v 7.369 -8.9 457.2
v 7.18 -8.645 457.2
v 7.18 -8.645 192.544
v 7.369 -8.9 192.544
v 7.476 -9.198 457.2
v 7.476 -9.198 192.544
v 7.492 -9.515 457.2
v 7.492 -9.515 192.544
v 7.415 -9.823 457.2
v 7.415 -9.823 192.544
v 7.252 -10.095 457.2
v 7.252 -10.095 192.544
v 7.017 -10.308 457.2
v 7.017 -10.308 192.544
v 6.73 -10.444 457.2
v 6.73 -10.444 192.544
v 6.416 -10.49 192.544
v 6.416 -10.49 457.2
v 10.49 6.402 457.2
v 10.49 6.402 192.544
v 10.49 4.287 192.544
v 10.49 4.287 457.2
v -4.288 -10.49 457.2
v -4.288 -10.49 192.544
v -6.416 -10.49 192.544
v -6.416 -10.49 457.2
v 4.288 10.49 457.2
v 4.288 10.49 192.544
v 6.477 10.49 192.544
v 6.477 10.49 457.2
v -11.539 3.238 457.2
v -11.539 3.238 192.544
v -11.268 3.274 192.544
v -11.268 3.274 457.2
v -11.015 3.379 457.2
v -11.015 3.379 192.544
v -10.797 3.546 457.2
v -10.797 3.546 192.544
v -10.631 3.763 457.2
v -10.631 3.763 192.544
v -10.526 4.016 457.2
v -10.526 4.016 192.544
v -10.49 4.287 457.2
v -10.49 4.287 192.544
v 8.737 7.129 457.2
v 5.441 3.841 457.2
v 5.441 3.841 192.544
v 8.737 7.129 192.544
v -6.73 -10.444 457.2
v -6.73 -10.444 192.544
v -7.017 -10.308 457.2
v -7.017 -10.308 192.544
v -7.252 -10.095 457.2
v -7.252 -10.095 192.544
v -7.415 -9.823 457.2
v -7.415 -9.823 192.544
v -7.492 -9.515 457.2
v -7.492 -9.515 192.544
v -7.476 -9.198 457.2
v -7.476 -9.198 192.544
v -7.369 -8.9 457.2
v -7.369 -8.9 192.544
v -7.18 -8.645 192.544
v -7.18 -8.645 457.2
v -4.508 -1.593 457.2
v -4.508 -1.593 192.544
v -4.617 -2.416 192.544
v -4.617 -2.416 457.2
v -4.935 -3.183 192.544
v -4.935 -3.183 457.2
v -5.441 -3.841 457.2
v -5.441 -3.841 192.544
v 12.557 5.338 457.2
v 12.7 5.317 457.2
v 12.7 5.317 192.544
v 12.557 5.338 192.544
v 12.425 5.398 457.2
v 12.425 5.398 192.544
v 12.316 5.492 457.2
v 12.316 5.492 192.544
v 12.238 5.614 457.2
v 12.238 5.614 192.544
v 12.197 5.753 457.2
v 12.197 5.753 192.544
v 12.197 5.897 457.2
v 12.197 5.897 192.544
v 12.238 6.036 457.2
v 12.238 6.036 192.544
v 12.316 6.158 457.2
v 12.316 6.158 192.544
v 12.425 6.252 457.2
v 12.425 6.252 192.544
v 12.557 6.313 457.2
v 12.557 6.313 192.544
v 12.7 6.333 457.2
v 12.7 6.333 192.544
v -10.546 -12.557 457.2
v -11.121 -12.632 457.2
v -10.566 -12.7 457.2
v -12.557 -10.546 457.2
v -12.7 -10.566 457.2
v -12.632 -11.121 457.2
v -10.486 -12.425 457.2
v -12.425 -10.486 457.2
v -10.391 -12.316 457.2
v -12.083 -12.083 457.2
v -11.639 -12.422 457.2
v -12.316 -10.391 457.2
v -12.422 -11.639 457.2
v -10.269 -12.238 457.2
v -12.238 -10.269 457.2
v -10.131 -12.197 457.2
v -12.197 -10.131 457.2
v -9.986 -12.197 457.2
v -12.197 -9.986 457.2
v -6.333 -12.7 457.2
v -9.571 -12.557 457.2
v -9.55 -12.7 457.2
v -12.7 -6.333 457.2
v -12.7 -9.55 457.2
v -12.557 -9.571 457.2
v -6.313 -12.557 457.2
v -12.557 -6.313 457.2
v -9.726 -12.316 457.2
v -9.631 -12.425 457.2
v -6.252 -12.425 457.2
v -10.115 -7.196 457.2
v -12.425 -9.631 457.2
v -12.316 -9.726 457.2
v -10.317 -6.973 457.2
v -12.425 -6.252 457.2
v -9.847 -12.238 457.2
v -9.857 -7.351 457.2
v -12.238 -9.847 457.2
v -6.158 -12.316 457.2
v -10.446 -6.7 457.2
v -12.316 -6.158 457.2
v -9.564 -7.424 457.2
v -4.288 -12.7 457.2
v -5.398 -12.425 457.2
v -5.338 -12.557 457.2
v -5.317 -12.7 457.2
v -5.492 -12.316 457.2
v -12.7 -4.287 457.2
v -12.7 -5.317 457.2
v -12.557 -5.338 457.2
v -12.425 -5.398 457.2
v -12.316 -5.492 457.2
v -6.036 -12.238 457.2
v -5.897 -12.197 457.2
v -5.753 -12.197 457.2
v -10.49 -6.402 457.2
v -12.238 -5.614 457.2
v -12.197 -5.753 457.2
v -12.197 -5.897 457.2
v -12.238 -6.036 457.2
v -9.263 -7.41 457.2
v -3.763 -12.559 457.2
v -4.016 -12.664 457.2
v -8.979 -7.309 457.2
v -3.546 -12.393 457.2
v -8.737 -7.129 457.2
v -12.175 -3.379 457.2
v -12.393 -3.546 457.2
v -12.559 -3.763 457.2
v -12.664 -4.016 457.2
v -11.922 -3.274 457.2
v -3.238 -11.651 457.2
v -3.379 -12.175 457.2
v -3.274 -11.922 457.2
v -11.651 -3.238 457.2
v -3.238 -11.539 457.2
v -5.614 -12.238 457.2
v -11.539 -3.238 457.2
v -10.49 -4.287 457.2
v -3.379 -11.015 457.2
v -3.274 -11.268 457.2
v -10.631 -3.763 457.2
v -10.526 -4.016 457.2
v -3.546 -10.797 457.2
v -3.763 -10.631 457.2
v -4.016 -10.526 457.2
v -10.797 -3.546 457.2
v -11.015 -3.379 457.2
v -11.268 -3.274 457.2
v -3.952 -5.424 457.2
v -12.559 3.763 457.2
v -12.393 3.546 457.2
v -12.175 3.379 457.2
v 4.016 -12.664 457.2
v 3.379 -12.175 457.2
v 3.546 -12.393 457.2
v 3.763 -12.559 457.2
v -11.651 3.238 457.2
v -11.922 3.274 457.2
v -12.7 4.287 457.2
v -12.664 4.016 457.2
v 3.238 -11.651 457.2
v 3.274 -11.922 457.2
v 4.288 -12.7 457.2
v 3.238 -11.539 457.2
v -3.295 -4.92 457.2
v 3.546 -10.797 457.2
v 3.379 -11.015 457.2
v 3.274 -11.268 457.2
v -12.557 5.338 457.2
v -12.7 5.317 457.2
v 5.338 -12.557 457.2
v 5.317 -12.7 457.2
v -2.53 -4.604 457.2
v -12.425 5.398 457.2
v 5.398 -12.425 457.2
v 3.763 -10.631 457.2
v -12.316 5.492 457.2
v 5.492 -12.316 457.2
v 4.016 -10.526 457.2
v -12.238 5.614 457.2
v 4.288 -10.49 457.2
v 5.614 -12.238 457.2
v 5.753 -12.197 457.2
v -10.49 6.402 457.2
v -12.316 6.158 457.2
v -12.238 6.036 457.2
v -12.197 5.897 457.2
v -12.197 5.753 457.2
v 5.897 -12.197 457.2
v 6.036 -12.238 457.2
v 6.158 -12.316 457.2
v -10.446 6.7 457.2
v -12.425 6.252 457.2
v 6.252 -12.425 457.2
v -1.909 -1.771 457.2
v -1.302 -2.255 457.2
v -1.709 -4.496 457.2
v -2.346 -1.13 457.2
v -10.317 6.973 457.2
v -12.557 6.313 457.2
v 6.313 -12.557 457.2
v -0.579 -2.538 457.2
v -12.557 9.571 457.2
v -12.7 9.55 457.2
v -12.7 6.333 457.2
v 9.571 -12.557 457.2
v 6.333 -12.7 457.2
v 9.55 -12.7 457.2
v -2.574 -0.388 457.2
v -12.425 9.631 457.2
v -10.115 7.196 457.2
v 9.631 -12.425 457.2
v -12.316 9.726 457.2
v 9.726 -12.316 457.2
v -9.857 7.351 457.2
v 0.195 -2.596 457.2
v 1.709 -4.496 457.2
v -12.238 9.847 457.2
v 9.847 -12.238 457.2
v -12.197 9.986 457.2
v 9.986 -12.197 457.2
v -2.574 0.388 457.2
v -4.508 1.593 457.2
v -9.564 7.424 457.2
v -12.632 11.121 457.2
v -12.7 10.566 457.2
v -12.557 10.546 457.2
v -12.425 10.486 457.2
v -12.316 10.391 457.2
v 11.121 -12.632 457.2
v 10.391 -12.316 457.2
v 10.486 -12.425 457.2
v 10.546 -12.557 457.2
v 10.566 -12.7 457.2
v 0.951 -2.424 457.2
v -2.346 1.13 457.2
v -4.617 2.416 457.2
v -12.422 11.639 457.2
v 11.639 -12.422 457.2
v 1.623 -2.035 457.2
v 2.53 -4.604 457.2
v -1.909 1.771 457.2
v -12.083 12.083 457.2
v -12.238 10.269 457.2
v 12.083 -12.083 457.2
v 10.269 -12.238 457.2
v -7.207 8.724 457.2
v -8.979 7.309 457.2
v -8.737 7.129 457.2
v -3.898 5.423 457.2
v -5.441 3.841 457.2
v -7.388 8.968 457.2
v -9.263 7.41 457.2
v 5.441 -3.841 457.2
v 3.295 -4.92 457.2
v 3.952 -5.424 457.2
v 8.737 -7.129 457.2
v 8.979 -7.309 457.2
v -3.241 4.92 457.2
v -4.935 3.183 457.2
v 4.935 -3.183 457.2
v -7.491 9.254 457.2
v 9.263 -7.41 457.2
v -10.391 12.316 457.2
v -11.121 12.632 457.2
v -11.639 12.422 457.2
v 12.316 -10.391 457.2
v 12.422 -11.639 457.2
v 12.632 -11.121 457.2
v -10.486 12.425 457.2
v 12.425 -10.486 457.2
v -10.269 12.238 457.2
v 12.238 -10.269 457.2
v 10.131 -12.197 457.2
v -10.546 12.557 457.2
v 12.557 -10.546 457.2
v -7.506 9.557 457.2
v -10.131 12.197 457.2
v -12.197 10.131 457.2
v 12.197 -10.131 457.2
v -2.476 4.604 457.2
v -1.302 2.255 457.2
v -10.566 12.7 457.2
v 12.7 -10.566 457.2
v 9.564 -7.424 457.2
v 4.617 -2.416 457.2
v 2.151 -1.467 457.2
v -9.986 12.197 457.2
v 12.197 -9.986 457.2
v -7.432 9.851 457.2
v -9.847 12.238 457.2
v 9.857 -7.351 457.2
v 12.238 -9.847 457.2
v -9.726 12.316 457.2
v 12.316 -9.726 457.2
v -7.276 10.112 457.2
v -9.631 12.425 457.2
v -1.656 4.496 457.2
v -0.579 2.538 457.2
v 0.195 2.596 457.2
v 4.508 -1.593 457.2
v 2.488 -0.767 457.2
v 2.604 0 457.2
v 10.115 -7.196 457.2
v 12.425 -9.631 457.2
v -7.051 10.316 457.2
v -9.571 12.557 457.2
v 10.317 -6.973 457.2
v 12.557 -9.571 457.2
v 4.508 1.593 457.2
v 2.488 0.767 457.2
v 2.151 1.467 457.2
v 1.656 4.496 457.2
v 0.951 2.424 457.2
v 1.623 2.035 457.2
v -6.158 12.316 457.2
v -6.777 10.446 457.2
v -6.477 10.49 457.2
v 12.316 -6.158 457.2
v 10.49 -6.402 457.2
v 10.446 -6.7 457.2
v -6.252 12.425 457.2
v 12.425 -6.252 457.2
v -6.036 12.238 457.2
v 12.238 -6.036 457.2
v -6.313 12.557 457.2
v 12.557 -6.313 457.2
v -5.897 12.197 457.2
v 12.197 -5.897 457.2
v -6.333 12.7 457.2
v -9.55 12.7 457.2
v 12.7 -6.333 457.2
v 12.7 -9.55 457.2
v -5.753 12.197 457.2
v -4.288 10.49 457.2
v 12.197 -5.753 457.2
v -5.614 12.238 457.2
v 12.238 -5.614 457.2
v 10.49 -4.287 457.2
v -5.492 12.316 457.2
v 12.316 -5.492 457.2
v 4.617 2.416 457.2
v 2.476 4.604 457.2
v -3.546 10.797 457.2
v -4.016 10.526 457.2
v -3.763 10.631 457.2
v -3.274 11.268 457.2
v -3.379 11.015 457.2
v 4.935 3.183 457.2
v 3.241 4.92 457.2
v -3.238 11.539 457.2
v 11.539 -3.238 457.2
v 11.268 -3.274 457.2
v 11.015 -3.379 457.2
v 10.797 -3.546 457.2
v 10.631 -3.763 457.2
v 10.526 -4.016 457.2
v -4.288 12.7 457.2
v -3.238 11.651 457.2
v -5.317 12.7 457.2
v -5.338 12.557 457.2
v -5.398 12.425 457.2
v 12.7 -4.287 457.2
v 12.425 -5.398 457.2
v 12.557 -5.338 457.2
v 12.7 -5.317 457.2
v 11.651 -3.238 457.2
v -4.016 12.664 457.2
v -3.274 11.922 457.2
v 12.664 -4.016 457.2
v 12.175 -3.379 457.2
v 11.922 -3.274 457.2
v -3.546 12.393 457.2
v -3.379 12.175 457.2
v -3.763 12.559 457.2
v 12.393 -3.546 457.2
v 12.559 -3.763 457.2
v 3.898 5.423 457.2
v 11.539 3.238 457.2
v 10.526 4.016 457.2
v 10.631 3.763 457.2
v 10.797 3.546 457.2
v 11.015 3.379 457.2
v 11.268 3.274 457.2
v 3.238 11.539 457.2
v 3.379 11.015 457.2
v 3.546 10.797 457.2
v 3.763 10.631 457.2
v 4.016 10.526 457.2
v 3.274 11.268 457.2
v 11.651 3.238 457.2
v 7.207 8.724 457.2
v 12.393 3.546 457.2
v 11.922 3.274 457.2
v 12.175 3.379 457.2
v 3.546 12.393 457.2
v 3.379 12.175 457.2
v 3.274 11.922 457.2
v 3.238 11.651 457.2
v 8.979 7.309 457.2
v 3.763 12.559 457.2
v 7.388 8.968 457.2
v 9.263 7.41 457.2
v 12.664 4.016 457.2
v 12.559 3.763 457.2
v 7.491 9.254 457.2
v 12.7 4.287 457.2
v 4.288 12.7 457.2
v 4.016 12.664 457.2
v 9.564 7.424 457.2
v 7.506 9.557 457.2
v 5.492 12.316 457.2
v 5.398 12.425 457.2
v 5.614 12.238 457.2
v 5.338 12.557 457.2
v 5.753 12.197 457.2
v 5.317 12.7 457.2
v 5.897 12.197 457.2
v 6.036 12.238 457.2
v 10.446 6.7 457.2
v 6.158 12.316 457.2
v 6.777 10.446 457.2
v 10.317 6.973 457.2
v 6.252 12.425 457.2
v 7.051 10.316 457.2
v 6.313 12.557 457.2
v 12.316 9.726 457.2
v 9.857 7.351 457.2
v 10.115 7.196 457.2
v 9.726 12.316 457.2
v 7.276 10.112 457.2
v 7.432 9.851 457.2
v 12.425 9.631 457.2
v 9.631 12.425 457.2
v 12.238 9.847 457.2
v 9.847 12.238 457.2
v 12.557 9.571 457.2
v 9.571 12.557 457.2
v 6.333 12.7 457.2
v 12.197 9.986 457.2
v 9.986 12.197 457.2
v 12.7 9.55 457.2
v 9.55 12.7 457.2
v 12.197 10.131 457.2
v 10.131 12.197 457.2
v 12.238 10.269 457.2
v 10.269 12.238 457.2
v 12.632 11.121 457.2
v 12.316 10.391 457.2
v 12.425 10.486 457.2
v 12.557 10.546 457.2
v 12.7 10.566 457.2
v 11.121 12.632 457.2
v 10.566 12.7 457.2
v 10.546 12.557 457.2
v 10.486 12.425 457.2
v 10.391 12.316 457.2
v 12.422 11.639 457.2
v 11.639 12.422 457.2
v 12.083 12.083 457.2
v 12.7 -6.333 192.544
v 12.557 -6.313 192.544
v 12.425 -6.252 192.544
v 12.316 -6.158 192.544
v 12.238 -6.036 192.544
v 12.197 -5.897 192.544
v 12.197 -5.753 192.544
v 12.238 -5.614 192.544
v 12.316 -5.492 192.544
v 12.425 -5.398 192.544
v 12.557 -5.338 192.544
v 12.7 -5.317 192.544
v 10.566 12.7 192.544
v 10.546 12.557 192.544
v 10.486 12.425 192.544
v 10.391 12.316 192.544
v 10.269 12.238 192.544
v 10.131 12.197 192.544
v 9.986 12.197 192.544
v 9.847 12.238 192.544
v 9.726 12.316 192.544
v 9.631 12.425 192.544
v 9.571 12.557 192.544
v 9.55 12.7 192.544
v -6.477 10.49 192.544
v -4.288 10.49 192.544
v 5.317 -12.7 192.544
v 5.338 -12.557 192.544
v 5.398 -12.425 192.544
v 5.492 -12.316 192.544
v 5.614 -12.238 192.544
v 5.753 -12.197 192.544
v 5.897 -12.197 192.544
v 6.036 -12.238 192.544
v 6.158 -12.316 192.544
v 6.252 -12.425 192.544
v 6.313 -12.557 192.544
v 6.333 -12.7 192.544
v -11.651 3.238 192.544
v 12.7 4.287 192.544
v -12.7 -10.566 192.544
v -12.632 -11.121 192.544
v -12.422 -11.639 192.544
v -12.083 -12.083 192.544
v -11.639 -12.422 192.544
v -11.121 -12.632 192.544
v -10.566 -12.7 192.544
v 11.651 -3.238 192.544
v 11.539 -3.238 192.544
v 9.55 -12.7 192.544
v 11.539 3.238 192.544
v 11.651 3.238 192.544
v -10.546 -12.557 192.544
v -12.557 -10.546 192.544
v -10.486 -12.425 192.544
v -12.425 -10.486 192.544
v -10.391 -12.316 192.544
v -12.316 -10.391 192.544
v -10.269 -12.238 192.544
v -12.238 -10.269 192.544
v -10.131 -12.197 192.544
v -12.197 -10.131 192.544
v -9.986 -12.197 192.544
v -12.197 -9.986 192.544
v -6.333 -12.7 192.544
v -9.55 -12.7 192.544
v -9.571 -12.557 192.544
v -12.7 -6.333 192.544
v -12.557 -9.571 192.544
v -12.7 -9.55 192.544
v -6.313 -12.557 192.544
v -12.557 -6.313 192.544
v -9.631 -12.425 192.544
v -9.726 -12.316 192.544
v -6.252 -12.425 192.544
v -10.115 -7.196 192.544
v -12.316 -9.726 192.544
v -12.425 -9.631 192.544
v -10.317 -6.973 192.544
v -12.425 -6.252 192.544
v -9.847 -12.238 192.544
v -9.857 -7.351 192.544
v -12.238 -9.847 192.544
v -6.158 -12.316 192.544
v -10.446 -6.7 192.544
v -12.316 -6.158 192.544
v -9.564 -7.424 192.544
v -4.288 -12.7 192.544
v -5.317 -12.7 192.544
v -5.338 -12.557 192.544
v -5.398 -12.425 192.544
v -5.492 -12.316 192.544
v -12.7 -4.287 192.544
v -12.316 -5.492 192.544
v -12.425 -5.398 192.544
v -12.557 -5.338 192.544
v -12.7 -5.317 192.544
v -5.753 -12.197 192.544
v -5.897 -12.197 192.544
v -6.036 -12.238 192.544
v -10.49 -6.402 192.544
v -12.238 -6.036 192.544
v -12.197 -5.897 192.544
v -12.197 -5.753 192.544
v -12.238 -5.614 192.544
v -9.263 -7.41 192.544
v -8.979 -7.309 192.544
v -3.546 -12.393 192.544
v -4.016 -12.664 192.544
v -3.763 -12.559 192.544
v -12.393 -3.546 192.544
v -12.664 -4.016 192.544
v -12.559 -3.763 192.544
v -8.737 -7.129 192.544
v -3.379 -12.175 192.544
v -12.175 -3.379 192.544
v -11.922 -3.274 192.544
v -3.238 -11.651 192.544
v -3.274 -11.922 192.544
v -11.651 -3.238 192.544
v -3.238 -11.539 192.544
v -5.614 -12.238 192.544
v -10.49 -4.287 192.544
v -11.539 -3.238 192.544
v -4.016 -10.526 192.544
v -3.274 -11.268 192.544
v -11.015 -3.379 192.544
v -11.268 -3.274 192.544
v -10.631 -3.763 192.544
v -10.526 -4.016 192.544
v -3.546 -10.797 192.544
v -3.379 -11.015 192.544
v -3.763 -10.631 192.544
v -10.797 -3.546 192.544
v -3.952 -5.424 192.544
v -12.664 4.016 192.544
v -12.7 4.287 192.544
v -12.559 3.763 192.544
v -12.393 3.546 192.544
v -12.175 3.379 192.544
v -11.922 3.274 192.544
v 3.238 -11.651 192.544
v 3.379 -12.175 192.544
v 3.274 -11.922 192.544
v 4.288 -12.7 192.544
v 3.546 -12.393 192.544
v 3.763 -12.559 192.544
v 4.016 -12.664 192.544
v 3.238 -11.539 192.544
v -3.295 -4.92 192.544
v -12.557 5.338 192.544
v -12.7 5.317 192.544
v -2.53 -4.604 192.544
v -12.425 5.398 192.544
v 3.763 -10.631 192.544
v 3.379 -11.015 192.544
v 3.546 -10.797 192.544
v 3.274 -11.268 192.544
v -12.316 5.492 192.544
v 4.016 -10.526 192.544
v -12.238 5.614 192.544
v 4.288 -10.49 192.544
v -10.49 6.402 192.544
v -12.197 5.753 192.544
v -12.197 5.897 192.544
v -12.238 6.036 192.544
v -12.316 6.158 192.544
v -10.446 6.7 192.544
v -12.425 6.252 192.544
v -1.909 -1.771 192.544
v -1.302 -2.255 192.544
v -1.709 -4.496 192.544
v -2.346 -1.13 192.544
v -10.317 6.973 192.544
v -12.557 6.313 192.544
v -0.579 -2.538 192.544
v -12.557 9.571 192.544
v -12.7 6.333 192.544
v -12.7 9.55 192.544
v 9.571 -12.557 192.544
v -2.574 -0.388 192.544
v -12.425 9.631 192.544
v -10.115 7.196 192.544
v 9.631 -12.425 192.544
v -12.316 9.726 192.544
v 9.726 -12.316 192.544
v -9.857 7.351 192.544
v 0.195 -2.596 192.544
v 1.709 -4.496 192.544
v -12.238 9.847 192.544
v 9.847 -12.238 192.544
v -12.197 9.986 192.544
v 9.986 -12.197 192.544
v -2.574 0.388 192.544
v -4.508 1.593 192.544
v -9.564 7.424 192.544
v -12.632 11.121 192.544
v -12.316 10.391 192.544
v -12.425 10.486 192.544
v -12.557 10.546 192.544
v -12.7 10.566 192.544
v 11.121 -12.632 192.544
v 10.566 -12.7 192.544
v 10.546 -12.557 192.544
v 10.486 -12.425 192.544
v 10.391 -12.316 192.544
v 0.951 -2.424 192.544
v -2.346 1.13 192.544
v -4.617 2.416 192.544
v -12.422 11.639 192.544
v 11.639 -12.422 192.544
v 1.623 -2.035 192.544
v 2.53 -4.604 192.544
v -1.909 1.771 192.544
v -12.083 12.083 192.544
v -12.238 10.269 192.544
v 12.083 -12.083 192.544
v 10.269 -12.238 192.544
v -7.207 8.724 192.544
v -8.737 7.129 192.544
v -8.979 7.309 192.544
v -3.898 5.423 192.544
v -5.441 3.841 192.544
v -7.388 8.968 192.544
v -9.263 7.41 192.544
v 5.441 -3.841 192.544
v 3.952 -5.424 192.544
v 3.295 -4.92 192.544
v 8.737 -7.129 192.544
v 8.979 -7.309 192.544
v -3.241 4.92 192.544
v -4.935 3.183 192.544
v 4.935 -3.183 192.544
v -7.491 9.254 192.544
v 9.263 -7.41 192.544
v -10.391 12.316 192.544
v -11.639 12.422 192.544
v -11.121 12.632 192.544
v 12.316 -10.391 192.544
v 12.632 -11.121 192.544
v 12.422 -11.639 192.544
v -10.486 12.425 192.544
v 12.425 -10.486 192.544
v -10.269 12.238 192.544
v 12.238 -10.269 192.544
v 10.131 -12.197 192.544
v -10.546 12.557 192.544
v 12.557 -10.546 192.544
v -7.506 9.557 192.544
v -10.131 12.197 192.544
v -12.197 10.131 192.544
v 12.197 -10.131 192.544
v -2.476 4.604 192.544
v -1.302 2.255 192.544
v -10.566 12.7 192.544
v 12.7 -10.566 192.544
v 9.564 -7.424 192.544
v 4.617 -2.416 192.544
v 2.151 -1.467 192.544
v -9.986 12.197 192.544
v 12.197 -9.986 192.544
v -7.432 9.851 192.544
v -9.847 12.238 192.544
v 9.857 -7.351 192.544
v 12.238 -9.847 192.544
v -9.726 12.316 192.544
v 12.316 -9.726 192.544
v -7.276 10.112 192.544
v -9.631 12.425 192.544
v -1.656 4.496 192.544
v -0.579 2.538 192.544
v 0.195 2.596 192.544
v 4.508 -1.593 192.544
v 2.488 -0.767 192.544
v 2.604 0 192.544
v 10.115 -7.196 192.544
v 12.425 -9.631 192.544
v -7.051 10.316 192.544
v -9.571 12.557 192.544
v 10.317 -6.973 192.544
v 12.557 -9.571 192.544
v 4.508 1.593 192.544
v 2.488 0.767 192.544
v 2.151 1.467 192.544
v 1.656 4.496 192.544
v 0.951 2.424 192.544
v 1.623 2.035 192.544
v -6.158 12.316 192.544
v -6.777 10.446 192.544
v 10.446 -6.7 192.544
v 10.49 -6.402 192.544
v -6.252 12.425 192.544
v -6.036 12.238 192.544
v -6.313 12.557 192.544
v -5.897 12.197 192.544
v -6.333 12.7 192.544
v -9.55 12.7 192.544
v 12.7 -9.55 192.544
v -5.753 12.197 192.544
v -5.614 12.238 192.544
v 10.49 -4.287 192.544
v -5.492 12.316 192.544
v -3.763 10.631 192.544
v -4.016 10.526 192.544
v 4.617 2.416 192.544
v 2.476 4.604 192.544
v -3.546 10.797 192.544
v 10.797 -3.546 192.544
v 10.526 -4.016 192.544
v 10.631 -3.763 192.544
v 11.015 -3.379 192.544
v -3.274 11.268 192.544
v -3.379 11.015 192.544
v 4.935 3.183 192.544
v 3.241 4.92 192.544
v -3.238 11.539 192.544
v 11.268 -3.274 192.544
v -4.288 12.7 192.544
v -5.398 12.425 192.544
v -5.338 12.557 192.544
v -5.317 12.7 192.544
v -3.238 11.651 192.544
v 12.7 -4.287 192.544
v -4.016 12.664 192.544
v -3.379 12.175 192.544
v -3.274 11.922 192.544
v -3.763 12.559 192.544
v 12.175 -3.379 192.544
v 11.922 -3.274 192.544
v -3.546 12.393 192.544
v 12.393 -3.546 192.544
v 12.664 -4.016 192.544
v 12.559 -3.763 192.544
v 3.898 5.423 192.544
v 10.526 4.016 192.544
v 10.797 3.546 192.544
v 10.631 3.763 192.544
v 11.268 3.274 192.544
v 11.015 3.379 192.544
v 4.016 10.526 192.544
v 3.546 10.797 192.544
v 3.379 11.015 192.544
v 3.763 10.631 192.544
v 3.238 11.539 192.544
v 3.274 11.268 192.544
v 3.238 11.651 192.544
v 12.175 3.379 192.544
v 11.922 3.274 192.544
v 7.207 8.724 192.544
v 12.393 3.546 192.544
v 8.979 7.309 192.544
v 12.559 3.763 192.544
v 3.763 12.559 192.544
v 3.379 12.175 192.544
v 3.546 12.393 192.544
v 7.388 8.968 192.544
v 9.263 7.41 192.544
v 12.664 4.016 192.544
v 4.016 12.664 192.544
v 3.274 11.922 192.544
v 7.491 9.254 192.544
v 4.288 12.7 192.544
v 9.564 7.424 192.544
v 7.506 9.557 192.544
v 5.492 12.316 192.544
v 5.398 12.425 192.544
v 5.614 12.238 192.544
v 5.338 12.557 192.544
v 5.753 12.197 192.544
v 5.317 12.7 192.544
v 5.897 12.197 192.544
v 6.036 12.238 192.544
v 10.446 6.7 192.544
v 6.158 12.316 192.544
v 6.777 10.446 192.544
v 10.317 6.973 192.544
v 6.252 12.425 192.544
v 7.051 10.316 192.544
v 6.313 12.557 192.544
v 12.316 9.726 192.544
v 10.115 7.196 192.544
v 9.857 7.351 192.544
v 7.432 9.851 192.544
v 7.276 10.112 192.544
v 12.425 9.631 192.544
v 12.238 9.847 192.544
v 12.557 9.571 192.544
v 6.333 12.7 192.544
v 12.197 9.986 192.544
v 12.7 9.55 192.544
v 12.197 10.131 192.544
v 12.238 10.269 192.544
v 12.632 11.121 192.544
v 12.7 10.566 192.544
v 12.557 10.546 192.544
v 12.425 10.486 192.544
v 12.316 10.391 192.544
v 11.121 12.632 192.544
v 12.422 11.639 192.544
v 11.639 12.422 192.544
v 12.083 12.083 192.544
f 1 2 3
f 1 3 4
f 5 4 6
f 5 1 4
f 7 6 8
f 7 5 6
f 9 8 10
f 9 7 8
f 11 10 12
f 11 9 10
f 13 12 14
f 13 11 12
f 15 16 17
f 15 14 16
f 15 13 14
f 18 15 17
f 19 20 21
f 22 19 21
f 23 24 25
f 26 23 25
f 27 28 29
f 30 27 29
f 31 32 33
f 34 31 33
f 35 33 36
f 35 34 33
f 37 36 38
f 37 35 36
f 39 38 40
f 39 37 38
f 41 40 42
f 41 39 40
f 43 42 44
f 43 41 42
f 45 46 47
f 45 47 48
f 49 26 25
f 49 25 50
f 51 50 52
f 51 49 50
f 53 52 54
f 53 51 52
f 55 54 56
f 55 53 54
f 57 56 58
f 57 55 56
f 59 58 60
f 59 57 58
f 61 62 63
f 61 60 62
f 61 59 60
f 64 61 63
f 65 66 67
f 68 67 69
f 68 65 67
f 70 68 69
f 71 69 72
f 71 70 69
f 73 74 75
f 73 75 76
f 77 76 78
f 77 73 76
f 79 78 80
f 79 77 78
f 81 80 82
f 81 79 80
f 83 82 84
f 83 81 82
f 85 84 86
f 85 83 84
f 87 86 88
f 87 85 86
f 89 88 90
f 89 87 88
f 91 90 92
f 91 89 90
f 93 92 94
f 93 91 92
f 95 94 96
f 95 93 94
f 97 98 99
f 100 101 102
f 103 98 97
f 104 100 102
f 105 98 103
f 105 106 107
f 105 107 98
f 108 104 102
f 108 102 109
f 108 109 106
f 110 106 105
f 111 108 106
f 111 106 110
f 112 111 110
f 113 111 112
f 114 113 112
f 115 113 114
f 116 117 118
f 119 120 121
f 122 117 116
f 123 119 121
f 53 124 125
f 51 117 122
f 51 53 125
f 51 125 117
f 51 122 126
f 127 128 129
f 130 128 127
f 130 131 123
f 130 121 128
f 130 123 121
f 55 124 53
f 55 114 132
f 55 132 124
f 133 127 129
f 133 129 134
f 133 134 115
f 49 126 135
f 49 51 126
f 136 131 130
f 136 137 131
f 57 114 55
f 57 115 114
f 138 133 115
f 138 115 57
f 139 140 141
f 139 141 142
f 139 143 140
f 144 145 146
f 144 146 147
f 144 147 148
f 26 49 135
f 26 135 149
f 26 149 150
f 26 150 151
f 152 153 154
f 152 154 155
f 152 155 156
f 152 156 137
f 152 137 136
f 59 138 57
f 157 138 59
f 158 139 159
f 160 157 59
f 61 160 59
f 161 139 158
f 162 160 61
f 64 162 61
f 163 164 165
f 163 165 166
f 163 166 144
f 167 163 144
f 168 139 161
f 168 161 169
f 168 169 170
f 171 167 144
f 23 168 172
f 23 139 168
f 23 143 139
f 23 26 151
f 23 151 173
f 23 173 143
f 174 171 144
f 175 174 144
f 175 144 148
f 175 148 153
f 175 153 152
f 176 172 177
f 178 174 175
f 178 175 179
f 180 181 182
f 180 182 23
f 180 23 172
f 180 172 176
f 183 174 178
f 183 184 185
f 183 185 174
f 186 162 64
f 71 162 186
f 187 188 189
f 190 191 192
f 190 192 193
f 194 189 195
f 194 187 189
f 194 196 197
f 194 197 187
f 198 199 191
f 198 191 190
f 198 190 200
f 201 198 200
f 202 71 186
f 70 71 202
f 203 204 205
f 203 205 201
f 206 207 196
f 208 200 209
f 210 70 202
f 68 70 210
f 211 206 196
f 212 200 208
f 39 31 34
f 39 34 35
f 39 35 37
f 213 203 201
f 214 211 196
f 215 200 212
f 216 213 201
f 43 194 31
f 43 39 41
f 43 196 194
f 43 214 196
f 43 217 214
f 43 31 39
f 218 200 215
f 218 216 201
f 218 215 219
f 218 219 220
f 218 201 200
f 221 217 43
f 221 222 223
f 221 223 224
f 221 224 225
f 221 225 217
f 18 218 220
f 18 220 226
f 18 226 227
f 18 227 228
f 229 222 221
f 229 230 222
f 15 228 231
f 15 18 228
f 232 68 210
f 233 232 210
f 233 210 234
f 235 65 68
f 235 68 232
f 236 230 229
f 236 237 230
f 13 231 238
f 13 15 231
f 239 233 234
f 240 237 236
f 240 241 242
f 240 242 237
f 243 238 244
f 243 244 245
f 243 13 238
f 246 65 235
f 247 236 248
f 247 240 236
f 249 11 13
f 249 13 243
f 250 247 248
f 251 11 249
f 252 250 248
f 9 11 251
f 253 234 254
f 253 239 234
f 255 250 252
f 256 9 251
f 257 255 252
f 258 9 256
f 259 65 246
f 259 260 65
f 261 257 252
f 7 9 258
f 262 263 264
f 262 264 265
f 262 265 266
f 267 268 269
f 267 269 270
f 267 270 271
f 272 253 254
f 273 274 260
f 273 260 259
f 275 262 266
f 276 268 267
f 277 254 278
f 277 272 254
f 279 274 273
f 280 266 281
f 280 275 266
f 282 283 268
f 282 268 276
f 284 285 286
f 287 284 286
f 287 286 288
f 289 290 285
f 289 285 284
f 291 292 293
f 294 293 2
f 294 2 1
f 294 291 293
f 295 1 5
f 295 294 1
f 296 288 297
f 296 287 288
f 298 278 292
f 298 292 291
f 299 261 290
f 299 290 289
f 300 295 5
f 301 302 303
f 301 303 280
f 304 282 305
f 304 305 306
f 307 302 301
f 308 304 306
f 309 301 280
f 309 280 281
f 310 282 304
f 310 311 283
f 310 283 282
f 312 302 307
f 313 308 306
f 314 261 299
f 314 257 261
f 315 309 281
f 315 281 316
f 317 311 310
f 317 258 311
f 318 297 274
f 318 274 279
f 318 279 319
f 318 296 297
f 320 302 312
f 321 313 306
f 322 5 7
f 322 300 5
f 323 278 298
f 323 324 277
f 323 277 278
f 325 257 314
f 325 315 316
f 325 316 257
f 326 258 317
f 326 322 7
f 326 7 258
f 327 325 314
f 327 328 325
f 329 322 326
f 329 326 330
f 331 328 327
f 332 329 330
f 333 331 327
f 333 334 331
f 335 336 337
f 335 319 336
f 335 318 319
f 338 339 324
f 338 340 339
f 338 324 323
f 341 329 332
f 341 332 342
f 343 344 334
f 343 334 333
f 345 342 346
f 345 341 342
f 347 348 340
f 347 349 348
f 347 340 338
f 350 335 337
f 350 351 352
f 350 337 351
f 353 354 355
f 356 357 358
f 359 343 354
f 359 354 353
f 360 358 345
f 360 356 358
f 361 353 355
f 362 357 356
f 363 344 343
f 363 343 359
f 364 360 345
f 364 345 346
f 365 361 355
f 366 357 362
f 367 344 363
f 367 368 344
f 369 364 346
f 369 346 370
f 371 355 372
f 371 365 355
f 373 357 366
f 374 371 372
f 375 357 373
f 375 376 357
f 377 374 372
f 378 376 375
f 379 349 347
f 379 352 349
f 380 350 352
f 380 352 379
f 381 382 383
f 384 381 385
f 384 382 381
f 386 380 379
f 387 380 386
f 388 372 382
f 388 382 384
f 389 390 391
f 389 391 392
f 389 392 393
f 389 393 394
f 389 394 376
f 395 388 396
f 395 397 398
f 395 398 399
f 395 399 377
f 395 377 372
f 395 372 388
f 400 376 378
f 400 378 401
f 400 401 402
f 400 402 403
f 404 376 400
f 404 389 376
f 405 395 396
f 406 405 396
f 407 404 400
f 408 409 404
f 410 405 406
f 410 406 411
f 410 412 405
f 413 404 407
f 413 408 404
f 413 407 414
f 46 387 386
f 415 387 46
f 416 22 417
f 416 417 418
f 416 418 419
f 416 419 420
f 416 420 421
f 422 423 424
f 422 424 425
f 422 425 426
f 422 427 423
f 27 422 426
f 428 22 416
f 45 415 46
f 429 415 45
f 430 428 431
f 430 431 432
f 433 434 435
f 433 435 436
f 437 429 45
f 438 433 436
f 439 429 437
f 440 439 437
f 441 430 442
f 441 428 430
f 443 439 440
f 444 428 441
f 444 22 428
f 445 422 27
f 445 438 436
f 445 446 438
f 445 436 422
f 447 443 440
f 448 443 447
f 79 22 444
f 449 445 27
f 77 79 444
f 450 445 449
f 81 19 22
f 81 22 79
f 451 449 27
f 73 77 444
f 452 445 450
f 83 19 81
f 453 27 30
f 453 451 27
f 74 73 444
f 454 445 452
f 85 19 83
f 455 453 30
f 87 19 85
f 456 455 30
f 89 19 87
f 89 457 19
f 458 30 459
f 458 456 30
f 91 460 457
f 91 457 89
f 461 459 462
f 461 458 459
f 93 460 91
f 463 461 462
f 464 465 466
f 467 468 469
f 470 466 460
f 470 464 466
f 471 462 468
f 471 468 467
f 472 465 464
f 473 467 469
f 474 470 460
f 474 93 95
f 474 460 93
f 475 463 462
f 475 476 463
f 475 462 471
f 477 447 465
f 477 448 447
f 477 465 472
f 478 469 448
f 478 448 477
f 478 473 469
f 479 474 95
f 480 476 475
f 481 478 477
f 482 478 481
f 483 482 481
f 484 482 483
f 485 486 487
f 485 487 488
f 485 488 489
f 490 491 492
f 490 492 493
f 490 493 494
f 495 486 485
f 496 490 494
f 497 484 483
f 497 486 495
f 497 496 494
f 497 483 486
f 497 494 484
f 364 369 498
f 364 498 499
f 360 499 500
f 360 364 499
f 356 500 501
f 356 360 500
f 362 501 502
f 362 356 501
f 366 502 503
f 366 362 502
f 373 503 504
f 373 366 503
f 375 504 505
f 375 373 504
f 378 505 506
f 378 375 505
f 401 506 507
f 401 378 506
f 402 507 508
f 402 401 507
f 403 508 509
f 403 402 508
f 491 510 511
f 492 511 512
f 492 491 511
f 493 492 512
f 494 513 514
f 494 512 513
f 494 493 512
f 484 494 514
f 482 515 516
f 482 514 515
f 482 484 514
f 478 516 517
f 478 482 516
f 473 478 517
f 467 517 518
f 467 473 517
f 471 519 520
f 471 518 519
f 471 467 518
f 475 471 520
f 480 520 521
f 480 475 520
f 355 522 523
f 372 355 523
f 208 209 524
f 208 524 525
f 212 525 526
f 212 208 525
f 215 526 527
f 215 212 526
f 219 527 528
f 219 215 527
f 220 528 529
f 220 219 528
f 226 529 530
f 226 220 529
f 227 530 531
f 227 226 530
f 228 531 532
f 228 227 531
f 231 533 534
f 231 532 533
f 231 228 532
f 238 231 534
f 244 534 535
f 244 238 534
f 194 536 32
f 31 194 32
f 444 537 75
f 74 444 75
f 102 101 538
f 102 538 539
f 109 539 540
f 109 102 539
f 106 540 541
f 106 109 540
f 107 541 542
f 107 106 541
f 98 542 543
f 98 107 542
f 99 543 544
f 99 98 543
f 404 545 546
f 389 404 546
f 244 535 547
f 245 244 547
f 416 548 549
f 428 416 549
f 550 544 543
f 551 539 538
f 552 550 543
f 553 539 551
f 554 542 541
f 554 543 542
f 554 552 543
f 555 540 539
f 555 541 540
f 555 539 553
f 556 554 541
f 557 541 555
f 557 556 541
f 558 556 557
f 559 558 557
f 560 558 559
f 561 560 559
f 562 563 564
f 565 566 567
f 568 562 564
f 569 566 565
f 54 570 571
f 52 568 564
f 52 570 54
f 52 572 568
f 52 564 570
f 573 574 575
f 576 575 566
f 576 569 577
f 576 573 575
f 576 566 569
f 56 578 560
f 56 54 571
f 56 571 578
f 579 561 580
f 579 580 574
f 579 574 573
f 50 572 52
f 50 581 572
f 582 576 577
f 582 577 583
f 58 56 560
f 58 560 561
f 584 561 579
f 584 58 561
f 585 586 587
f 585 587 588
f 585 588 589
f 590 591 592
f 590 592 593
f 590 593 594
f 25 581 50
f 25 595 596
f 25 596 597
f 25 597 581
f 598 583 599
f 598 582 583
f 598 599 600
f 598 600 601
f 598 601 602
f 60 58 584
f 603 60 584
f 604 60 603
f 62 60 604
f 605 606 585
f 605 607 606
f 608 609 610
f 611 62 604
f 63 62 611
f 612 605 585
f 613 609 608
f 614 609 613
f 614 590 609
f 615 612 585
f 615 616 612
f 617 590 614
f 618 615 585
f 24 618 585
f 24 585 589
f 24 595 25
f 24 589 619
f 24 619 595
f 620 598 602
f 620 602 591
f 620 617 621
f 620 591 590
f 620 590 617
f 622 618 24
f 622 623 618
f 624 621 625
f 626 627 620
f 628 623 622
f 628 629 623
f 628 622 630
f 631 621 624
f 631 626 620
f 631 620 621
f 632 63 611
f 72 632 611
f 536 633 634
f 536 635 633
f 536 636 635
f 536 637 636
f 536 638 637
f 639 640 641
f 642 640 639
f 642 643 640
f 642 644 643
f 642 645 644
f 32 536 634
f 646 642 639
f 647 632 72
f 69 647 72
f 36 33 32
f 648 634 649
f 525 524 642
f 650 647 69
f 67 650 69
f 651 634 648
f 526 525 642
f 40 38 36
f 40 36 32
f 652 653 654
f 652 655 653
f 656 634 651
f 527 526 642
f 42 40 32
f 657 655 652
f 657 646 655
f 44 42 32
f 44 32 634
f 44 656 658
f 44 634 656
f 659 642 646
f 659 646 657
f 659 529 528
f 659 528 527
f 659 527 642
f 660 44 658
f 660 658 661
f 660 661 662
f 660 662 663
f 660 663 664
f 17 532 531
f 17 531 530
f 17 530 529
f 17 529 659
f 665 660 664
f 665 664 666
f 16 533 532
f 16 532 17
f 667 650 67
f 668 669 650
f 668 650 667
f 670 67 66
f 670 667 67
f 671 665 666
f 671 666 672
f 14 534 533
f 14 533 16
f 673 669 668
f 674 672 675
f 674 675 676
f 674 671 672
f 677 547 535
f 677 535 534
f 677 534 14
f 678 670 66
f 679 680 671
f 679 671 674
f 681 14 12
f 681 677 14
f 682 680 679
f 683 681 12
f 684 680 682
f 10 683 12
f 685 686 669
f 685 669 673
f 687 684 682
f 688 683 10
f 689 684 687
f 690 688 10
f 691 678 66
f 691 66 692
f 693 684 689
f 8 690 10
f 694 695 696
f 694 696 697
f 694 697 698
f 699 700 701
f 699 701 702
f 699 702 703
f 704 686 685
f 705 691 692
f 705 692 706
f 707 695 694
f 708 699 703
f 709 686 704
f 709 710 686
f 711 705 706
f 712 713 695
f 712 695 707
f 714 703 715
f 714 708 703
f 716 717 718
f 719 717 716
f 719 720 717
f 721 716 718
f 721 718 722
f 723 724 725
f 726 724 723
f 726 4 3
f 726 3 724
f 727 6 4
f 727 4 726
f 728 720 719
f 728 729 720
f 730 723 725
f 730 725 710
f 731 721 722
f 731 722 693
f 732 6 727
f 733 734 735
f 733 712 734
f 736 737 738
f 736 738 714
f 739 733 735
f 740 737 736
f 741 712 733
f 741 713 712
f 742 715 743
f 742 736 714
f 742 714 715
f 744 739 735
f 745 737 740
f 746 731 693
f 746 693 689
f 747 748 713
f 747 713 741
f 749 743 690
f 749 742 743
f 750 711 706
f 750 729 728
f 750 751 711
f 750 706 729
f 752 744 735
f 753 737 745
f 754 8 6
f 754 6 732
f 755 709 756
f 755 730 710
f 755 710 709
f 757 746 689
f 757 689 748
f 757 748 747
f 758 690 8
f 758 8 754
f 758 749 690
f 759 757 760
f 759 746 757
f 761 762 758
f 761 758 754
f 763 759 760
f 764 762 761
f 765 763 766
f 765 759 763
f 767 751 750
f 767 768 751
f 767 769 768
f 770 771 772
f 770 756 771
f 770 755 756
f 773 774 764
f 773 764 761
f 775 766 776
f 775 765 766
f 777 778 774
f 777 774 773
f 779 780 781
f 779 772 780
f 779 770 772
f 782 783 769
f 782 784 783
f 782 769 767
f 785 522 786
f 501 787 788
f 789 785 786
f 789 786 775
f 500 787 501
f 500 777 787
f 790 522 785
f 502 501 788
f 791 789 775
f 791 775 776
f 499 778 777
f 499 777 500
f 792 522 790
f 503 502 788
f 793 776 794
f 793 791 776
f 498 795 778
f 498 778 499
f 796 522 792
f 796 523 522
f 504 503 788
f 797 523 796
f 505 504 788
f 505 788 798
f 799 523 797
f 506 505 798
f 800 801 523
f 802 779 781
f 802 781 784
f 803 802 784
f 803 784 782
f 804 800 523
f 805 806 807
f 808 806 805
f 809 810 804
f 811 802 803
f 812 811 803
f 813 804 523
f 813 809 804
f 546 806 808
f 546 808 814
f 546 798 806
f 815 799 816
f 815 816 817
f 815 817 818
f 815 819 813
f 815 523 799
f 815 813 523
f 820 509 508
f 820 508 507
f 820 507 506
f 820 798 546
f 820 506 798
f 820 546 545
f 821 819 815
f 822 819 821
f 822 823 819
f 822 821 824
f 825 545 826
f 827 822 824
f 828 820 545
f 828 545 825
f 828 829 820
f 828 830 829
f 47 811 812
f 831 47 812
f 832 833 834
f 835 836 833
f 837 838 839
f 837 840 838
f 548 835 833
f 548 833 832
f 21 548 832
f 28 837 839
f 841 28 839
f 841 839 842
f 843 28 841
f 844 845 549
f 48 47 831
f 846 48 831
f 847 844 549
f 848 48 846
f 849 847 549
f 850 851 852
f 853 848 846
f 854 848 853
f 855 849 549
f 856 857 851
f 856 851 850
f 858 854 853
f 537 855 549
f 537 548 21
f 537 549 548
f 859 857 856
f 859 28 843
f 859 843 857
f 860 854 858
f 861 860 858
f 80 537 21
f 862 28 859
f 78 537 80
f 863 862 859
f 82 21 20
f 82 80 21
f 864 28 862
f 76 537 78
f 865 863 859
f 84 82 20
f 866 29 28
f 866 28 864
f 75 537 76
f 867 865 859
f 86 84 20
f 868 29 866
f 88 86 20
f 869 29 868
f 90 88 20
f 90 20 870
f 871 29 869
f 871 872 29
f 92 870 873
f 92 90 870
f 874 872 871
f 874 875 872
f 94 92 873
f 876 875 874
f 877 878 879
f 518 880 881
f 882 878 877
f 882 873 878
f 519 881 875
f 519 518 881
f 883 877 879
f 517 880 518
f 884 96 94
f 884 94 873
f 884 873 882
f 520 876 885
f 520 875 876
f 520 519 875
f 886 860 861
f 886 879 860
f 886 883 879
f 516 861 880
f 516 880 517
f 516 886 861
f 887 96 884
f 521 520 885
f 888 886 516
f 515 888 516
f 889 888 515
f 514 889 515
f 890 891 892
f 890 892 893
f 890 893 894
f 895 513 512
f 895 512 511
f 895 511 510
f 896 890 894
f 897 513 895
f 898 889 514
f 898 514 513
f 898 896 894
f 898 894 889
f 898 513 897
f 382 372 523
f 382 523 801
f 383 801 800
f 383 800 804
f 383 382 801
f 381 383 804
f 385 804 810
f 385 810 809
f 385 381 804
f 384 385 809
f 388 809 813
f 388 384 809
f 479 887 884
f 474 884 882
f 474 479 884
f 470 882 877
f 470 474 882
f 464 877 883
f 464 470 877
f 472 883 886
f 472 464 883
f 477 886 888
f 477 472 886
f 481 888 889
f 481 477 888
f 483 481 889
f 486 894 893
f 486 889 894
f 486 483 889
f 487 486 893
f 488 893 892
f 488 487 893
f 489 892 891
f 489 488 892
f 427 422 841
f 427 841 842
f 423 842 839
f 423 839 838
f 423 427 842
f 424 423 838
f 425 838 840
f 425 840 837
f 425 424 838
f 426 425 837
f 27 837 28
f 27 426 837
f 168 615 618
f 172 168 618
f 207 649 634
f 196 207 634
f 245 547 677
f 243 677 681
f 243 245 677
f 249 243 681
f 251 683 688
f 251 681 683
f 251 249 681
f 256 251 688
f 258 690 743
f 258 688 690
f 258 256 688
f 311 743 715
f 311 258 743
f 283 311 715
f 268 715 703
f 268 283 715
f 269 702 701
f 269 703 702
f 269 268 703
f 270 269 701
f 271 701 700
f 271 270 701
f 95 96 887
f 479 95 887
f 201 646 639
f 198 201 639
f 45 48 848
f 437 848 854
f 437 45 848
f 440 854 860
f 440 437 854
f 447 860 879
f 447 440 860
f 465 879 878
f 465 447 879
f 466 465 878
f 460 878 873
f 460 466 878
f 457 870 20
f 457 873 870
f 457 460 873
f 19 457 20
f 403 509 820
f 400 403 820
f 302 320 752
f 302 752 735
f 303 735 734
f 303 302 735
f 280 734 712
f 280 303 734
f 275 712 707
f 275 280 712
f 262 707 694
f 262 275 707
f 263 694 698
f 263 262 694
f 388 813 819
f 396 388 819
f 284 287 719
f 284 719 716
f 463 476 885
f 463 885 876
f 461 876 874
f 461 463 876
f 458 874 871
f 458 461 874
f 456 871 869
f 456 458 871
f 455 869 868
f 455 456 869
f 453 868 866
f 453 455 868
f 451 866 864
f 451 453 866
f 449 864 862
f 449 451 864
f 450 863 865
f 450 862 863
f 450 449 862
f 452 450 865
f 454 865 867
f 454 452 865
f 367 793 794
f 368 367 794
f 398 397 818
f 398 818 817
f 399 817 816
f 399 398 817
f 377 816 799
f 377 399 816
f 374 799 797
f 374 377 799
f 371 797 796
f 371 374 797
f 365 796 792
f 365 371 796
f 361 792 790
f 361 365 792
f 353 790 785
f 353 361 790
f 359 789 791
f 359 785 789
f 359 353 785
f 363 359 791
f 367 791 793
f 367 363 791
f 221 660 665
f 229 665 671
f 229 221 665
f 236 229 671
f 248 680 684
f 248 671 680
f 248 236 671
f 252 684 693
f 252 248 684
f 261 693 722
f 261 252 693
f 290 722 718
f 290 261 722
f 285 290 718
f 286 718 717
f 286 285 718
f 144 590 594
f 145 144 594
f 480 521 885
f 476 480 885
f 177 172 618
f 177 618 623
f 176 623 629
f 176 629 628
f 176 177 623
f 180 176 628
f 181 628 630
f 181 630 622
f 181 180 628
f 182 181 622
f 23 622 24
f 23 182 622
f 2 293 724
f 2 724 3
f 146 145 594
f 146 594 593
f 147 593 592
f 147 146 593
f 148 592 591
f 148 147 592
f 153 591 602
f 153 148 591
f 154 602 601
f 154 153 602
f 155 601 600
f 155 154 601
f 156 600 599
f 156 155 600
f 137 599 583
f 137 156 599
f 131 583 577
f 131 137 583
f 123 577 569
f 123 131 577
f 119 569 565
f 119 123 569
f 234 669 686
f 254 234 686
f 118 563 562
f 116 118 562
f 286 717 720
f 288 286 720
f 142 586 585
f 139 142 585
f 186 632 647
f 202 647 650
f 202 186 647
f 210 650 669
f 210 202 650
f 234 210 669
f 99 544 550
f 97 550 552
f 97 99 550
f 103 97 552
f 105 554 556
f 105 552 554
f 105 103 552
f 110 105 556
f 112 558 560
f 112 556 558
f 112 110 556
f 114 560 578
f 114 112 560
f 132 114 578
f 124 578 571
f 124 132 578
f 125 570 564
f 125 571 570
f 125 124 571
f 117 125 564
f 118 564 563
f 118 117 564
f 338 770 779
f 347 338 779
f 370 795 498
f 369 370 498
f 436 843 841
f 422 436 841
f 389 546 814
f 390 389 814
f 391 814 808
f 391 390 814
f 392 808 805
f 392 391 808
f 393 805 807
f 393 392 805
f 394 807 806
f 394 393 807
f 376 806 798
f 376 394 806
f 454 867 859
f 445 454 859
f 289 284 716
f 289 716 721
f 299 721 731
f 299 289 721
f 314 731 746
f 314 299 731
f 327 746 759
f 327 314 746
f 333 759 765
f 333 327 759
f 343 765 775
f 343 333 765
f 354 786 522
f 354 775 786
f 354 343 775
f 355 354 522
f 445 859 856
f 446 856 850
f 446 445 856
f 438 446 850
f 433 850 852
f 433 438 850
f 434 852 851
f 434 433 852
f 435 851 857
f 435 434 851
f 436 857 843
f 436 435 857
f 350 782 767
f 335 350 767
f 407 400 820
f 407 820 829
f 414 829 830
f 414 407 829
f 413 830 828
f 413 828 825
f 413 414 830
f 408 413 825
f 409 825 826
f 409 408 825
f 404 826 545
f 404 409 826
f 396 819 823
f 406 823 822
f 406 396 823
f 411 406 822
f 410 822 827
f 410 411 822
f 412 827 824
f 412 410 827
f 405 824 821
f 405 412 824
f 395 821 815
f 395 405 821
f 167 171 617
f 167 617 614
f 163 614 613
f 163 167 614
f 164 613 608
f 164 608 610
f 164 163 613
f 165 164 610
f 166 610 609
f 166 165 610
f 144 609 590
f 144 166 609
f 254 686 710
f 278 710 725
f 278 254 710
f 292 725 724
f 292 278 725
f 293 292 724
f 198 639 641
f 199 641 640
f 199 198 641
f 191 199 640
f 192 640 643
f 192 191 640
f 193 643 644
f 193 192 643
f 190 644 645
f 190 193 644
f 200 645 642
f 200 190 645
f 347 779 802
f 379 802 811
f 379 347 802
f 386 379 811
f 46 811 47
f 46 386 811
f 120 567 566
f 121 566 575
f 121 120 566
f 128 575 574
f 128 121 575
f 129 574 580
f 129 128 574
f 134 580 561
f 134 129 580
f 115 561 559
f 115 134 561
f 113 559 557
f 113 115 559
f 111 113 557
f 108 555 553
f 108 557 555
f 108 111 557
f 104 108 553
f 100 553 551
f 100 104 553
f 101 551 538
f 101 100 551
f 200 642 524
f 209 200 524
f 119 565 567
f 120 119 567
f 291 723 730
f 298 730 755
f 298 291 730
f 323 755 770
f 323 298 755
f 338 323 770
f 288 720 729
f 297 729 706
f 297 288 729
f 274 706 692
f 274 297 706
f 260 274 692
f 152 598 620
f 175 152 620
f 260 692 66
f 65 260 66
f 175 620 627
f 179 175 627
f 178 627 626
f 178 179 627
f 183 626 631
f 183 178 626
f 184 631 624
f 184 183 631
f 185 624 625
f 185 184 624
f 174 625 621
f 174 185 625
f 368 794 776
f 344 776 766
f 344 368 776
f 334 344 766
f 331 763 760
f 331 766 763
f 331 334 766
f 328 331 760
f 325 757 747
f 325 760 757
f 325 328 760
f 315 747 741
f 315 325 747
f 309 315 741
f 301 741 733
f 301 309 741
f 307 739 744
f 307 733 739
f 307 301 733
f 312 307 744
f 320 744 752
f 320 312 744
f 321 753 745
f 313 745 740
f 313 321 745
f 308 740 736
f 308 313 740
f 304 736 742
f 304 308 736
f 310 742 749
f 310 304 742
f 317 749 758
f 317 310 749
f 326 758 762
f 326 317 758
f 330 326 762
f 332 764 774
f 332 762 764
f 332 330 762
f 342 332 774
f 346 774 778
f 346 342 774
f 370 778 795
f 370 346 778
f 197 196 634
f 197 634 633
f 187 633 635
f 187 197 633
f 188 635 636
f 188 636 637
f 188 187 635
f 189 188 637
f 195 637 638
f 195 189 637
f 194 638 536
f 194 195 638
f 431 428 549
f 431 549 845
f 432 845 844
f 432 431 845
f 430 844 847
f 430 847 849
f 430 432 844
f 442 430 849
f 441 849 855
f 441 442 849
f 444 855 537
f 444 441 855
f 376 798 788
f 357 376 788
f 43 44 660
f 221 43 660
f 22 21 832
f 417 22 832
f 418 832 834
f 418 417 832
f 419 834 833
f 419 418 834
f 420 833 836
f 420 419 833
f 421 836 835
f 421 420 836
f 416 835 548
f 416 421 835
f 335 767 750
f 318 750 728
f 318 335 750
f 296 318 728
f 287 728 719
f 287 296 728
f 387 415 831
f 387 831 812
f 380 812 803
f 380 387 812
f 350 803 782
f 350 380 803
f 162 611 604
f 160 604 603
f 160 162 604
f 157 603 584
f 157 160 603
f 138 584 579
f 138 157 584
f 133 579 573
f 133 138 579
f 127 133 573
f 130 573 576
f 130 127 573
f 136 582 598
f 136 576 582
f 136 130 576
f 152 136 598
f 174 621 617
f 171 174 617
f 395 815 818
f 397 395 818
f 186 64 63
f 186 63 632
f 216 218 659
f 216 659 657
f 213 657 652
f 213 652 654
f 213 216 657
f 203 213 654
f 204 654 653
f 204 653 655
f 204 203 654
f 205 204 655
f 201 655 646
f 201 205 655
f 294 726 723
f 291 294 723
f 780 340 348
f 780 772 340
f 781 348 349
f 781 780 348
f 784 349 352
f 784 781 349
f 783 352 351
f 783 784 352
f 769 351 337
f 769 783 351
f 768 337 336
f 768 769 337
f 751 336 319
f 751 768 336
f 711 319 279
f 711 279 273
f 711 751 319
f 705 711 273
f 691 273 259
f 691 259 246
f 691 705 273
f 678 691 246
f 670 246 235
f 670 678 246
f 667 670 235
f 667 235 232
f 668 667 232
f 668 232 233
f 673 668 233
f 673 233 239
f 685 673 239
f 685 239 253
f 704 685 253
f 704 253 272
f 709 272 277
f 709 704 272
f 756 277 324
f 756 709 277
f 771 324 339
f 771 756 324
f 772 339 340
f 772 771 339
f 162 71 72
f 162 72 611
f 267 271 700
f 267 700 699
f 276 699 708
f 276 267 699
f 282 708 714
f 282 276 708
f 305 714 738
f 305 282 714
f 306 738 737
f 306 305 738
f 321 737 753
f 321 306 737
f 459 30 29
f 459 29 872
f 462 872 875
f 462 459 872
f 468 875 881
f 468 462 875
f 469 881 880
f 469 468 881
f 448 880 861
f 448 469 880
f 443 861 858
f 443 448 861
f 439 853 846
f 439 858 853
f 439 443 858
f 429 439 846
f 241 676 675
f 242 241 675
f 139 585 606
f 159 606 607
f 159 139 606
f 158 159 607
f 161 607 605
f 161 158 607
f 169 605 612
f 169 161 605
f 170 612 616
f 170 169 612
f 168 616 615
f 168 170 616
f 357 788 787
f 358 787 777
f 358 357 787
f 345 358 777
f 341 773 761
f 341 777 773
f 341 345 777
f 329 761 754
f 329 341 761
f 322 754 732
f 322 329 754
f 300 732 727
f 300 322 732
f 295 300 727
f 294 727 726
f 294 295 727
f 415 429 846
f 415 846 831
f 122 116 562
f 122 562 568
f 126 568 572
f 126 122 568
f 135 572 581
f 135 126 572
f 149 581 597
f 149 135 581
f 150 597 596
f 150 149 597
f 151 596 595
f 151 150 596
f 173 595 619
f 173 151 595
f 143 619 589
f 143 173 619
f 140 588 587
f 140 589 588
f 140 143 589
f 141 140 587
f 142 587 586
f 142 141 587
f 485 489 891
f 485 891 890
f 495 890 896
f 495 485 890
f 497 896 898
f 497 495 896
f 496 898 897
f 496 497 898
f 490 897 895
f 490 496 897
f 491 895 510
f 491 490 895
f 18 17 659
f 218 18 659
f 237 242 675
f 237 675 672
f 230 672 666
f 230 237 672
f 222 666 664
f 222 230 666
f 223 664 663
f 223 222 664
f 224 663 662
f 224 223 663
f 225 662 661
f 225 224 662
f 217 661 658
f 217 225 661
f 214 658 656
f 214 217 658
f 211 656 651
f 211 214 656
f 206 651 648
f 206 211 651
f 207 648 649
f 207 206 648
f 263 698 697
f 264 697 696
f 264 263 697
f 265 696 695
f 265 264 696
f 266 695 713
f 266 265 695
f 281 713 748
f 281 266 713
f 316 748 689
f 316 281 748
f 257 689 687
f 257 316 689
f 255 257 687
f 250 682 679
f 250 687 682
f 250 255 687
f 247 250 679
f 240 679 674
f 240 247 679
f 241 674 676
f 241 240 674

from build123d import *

# Parameters (mm, degrees)
SKETCH1_R               = 2.6035
BOSS_EXTRUDE1_DEPTH     = 457.2
CUT_EXTRUDE2_DEPTH      = 4.318
CUT_EXTRUDE2_DEPTH_BACK = 26.924
SKETCH5_W               = 400.863196081
SKETCH5_H               = 43.327238712
CUT_EXTRUDE3_DEPTH      = 26.4


with BuildPart() as part:
    # Sketch1 → Boss-Extrude1 (new body, symmetric)
    with BuildSketch(Plane.XY):
        with BuildLine():
            Line((-7.179650497, -8.645192506), (-3.952270251, -5.423690499))
            ThreePointArc((-3.952270251, -5.423690499), (-2.922936451, -4.736929036), (-1.709253557, -4.4958))
            Line((-1.709253557, -4.4958), (1.709253557, -4.4958))
            ThreePointArc((1.709253557, -4.4958), (2.922936451, -4.736929036), (3.952270251, -5.423690499))
            Line((3.952270251, -5.423690499), (7.179650497, -8.645192506))
            ThreePointArc((7.179650497, -8.645192506), (7.41473083, -9.822813117), (6.416408329, -10.4902))
            Line((6.416408329, -10.4902), (4.287512407, -10.4902))
            ThreePointArc((4.287512407, -10.4902), (3.54574862, -10.79744862), (3.2385, -11.539212407))
            Line((3.2385, -11.539212407), (3.2385, -11.650987593))
            ThreePointArc((3.2385, -11.650987593), (3.54574862, -12.39275138), (4.287512407, -12.7))
            Line((4.287512407, -12.7), (5.317126718, -12.7))
            ThreePointArc((5.317126718, -12.7), (5.825126718, -12.192), (6.333126718, -12.7))
            Line((6.333126718, -12.7), (9.550443118, -12.7))
            ThreePointArc((9.550443118, -12.7), (10.058366869, -12.192000006), (10.566443095, -12.699847501))
            ThreePointArc((10.566443095, -12.699847501), (12.082537762, -12.08250727), (12.699846982, -10.566399977))
            ThreePointArc((12.699846982, -10.566399977), (12.192000006, -10.058323491), (12.7, -9.5504))
            Line((12.7, -9.5504), (12.7, -6.3330836))
            ThreePointArc((12.7, -6.3330836), (12.192, -5.8250836), (12.7, -5.3170836))
            Line((12.7, -5.3170836), (12.7, -4.287469289))
            ThreePointArc((12.7, -4.287469289), (12.39275138, -3.545705502), (11.650987593, -3.238456882))
            Line((11.650987593, -3.238456882), (11.539212407, -3.238456882))
            ThreePointArc((11.539212407, -3.238456882), (10.79744862, -3.545705502), (10.4902, -4.287469289))
            Line((10.4902, -4.287469289), (10.4902, -6.402089023))
            ThreePointArc((10.4902, -6.402089023), (9.856505071, -7.351067942), (8.737131347, -7.129408934))
            Line((8.737131347, -7.129408934), (5.441005833, -3.840816462))
            ThreePointArc((5.441005833, -3.840816462), (4.750877967, -2.809883091), (4.5085, -1.593185507))
            Line((4.5085, -1.593185507), (4.5085, 1.593185507))
            ThreePointArc((4.5085, 1.593185507), (4.750877967, 2.809883091), (5.441005833, 3.840816462))
            Line((5.441005833, 3.840816462), (8.737131347, 7.129408934))
            ThreePointArc((8.737131347, 7.129408934), (9.856505071, 7.351067942), (10.4902, 6.402089023))
            Line((10.4902, 6.402089023), (10.4902, 4.287469289))
            ThreePointArc((10.4902, 4.287469289), (10.79744862, 3.545705502), (11.539212407, 3.238456882))
            Line((11.539212407, 3.238456882), (11.650987593, 3.238456882))
            ThreePointArc((11.650987593, 3.238456882), (12.39275138, 3.545705502), (12.7, 4.287469289))
            Line((12.7, 4.287469289), (12.7, 5.3170836))
            ThreePointArc((12.7, 5.3170836), (12.192, 5.8250836), (12.7, 6.3330836))
            Line((12.7, 6.3330836), (12.7, 9.5504))
            ThreePointArc((12.7, 9.5504), (12.192000006, 10.058323491), (12.699846982, 10.566399977))
            ThreePointArc((12.699846982, 10.566399977), (12.082537762, 12.08250727), (10.566443095, 12.699847501))
            ThreePointArc((10.566443095, 12.699847501), (10.058366869, 12.192000006), (9.550443118, 12.7))
            Line((9.550443118, 12.7), (6.333126718, 12.7))
            ThreePointArc((6.333126718, 12.7), (5.825126718, 12.192), (5.317126718, 12.7))
            Line((5.317126718, 12.7), (4.287512407, 12.7))
            ThreePointArc((4.287512407, 12.7), (3.54574862, 12.39275138), (3.2385, 11.650987593))
            Line((3.2385, 11.650987593), (3.2385, 11.539212407))
            ThreePointArc((3.2385, 11.539212407), (3.54574862, 10.79744862), (4.287512407, 10.4902))
            Line((4.287512407, 10.4902), (6.476788598, 10.4902))
            ThreePointArc((6.476788598, 10.4902), (7.432222385, 9.85140422), (7.207036008, 8.724370562))
            Line((7.207036008, 8.724370562), (3.898272566, 5.423169045))
            ThreePointArc((3.898272566, 5.423169045), (2.869120213, 4.736787962), (1.655778399, 4.4958))
            Line((1.655778399, 4.4958), (-1.655778399, 4.4958))
            ThreePointArc((-1.655778399, 4.4958), (-2.869120213, 4.736787962), (-3.898272566, 5.423169045))
            Line((-3.898272566, 5.423169045), (-7.207036008, 8.724370562))
            ThreePointArc((-7.207036008, 8.724370562), (-7.432222385, 9.85140422), (-6.476788598, 10.4902))
            Line((-6.476788598, 10.4902), (-4.287512407, 10.4902))
            ThreePointArc((-4.287512407, 10.4902), (-3.54574862, 10.79744862), (-3.2385, 11.539212407))
            Line((-3.2385, 11.539212407), (-3.2385, 11.650987593))
            ThreePointArc((-3.2385, 11.650987593), (-3.54574862, 12.39275138), (-4.287512407, 12.7))
            Line((-4.287512407, 12.7), (-5.317126718, 12.7))
            ThreePointArc((-5.317126718, 12.7), (-5.825126718, 12.192), (-6.333126718, 12.7))
            Line((-6.333126718, 12.7), (-9.550443118, 12.7))
            ThreePointArc((-9.550443118, 12.7), (-10.058366869, 12.192000006), (-10.566443095, 12.699847501))
            ThreePointArc((-10.566443095, 12.699847501), (-12.082537762, 12.08250727), (-12.699846982, 10.566399977))
            ThreePointArc((-12.699846982, 10.566399977), (-12.192000006, 10.058323491), (-12.7, 9.5504))
            Line((-12.7, 9.5504), (-12.7, 6.3330836))
            ThreePointArc((-12.7, 6.3330836), (-12.192, 5.8250836), (-12.7, 5.3170836))
            Line((-12.7, 5.3170836), (-12.7, 4.287469289))
            ThreePointArc((-12.7, 4.287469289), (-12.39275138, 3.545705502), (-11.650987593, 3.238456882))
            Line((-11.650987593, 3.238456882), (-11.539212407, 3.238456882))
            ThreePointArc((-11.539212407, 3.238456882), (-10.79744862, 3.545705502), (-10.4902, 4.287469289))
            Line((-10.4902, 4.287469289), (-10.4902, 6.402089023))
            ThreePointArc((-10.4902, 6.402089023), (-9.856505071, 7.351067942), (-8.737131347, 7.129408934))
            Line((-8.737131347, 7.129408934), (-5.441005833, 3.840816462))
            ThreePointArc((-5.441005833, 3.840816462), (-4.750877967, 2.809883091), (-4.5085, 1.593185507))
            Line((-4.5085, 1.593185507), (-4.5085, -1.593185507))
            ThreePointArc((-4.5085, -1.593185507), (-4.750877967, -2.809883091), (-5.441005833, -3.840816462))
            Line((-5.441005833, -3.840816462), (-8.737131347, -7.129408934))
            ThreePointArc((-8.737131347, -7.129408934), (-9.856505071, -7.351067942), (-10.4902, -6.402089023))
            Line((-10.4902, -6.402089023), (-10.4902, -4.287469289))
            ThreePointArc((-10.4902, -4.287469289), (-10.79744862, -3.545705502), (-11.539212407, -3.238456882))
            Line((-11.539212407, -3.238456882), (-11.650987593, -3.238456882))
            ThreePointArc((-11.650987593, -3.238456882), (-12.39275138, -3.545705502), (-12.7, -4.287469289))
            Line((-12.7, -4.287469289), (-12.7, -5.3170836))
            ThreePointArc((-12.7, -5.3170836), (-12.192, -5.8250836), (-12.7, -6.3330836))
            Line((-12.7, -6.3330836), (-12.7, -9.5504))
            ThreePointArc((-12.7, -9.5504), (-12.192000006, -10.058323491), (-12.699846982, -10.566399977))
            ThreePointArc((-12.699846982, -10.566399977), (-12.082537762, -12.08250727), (-10.566443095, -12.699847501))
            ThreePointArc((-10.566443095, -12.699847501), (-10.058366869, -12.192000006), (-9.550443118, -12.7))
            Line((-9.550443118, -12.7), (-6.333126718, -12.7))
            ThreePointArc((-6.333126718, -12.7), (-5.825126718, -12.192), (-5.317126718, -12.7))
            Line((-5.317126718, -12.7), (-4.287512407, -12.7))
            ThreePointArc((-4.287512407, -12.7), (-3.54574862, -12.39275138), (-3.2385, -11.650987593))
            Line((-3.2385, -11.650987593), (-3.2385, -11.539212407))
            ThreePointArc((-3.2385, -11.539212407), (-3.54574862, -10.79744862), (-4.287512407, -10.4902))
            Line((-4.287512407, -10.4902), (-6.416408329, -10.4902))
            ThreePointArc((-6.416408329, -10.4902), (-7.41473083, -9.822813117), (-7.179650497, -8.645192506))
        make_face()
        Circle(SKETCH1_R, mode=Mode.SUBTRACT)
    extrude(amount=BOSS_EXTRUDE1_DEPTH, both=True)

    # Sketch3 → Cut-Extrude2 (cut, two sides)
    with BuildSketch(Plane.ZY.offset(12.7)) as cut_extrude2_sk:
        Polygon((-203.2, -27.552777595), (-203.2, 21.158109763), (-461.090893327, 21.158109763), (-461.090893327, -25.4), align=None)
    extrude(amount=CUT_EXTRUDE2_DEPTH, mode=Mode.SUBTRACT)
    extrude(cut_extrude2_sk.sketch, amount=-CUT_EXTRUDE2_DEPTH_BACK, mode=Mode.SUBTRACT)

    # Sketch5 → Cut-Extrude3 (cut, through all)
    with BuildSketch(Plane(origin=(12.7, 0, 0), x_dir=(0, 0, -1), z_dir=(1, 0, 0))):
        with Locations((7.887376468, 2.312510515)):
            Rectangle(SKETCH5_W, SKETCH5_H)
    extrude(amount=-CUT_EXTRUDE3_DEPTH, mode=Mode.SUBTRACT)


solid = part.part
